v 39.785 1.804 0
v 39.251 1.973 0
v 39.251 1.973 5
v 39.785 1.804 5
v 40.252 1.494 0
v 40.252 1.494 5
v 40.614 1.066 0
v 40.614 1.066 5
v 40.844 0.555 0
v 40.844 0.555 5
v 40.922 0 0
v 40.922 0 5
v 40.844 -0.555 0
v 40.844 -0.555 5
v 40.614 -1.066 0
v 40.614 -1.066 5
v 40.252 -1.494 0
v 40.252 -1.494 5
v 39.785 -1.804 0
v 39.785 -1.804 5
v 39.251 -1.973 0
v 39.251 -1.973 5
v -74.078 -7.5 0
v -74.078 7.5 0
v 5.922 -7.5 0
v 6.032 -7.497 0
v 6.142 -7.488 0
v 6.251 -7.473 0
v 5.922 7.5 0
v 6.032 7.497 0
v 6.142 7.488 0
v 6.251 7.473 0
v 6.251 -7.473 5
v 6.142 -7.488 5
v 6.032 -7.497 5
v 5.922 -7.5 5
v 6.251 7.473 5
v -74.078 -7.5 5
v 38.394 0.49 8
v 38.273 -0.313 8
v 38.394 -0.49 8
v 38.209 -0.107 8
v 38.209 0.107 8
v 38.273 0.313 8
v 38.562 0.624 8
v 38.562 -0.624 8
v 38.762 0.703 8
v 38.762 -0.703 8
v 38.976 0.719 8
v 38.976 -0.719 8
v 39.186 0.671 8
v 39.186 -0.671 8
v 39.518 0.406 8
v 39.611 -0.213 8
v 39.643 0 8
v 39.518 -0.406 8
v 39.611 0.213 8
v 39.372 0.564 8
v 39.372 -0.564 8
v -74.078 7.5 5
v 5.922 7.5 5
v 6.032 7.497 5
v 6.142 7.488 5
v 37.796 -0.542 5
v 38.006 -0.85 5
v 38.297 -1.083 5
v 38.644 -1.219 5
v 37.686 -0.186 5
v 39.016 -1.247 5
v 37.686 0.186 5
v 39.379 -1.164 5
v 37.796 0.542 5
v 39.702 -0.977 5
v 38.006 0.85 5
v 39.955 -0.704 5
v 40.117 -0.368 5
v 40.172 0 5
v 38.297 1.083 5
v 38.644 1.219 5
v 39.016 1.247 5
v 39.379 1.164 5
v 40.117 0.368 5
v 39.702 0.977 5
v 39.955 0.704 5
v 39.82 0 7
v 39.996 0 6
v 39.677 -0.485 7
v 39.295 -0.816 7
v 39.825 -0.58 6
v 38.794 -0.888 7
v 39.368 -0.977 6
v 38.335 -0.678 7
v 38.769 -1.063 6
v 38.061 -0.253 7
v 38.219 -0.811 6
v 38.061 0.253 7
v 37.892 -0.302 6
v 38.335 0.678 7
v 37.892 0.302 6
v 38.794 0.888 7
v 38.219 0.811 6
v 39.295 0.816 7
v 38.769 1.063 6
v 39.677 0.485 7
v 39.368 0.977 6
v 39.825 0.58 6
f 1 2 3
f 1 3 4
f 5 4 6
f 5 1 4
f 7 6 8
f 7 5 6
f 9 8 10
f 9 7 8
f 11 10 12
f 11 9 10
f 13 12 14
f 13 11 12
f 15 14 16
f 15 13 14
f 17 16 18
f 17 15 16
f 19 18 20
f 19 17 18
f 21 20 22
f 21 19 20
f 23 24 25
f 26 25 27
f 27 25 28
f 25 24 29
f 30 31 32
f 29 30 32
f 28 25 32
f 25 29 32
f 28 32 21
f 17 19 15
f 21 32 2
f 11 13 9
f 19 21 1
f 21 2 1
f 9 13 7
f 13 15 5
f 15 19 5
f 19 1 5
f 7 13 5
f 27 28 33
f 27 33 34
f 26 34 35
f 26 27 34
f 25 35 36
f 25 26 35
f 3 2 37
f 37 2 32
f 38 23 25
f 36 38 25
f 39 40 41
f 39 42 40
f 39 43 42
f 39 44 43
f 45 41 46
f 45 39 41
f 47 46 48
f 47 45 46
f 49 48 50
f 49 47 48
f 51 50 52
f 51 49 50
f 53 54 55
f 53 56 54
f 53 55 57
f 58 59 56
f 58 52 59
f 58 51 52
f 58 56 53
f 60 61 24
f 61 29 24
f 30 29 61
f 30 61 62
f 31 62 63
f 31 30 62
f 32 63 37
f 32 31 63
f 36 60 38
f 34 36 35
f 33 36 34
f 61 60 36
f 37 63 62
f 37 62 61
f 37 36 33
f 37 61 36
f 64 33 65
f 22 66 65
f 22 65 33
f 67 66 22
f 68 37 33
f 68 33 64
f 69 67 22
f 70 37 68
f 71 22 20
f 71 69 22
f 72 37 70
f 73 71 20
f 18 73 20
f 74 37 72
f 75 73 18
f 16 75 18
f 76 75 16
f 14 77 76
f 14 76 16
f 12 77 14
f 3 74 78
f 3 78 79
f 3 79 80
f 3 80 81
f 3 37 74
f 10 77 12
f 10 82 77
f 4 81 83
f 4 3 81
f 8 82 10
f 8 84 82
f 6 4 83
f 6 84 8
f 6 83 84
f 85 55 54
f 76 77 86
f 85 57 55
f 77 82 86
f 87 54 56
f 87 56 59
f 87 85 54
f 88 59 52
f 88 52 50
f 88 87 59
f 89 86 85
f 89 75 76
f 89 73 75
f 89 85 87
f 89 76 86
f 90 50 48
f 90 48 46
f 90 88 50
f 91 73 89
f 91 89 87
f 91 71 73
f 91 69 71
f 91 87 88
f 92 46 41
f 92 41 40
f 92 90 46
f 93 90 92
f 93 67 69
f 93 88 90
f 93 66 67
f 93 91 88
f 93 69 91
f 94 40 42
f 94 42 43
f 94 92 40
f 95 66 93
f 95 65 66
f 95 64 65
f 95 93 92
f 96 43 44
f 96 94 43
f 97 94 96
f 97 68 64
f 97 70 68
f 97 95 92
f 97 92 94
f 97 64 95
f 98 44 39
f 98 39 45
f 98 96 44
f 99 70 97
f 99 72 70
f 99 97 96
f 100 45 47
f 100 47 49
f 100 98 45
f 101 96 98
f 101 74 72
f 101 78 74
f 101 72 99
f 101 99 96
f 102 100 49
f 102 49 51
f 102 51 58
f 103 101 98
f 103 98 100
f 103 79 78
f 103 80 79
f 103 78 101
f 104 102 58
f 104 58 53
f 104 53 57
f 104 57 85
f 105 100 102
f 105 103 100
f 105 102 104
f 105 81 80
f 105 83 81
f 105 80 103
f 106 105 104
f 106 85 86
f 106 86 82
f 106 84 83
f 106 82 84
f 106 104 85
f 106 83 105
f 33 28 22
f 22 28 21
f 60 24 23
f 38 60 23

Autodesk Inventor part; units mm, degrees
ref_plane "YZ Plane" through (0, 0, 0) normal (1, 0, 0) x (0, 1, 0)
ref_plane "XZ Plane" through (0, 0, 0) normal (0, 1, 0) x (-1, 0, 0)
ref_plane "XY Plane" through (0, 0, 0) normal (0, 0, 1) x (1, 0, 0)
sketch "Skizze1" plane through (0, 0, 0) normal (0, 0, 1) x (1, 0, 0)
  line L0 (-74.0778, 7.5) -> (-74.0778, -7.5)
  line L1 (-74.0778, -7.5) -> (5.9222, -7.5)
  line L2 (6.251, -7.4728) -> (39.251, -1.9728)
  line L3 (39.251, 1.9728) -> (6.251, 7.4728)
  line L4 (5.9222, 7.5) -> (-74.0778, 7.5)
  arc A0 (6.251, 7.4728) -> (5.9222, 7.5) centre (5.9222, 5.5) ccw
  arc A1 (5.9222, -7.5) -> (6.251, -7.4728) centre (5.9222, -5.5) ccw
  arc A2 (39.251, -1.9728) -> (39.251, 1.9728) centre (38.9222, 0) ccw
  line L5 (-97.0778, 0) -> (63.9222, 0) projected
  point P0 (0, 0)
  dimension "d0" = 2
  dimension "d1" = 2
  dimension "d2" = 115
  dimension "d3" = 80
  dimension "d9" = 15
extrude "Extrusion1" add sketch "Skizze1" along normal blind 5
sketch "Skizze2" plane through (0, 0, 5) normal (0, 0, 1) x (1, 0, 0)
  arc A0 (39.251, -1.9728) -> (39.251, 1.9728) centre (38.9222, 0) ccw projected
  circle A1 centre (38.9222, 0) radius 1.25
  point P0 (0, 0)
  dimension "d6" = 2.5
extrude "Extrusion2" add sketch "Skizze2" along normal blind 3 draft -10
properties part number "Sensor"
